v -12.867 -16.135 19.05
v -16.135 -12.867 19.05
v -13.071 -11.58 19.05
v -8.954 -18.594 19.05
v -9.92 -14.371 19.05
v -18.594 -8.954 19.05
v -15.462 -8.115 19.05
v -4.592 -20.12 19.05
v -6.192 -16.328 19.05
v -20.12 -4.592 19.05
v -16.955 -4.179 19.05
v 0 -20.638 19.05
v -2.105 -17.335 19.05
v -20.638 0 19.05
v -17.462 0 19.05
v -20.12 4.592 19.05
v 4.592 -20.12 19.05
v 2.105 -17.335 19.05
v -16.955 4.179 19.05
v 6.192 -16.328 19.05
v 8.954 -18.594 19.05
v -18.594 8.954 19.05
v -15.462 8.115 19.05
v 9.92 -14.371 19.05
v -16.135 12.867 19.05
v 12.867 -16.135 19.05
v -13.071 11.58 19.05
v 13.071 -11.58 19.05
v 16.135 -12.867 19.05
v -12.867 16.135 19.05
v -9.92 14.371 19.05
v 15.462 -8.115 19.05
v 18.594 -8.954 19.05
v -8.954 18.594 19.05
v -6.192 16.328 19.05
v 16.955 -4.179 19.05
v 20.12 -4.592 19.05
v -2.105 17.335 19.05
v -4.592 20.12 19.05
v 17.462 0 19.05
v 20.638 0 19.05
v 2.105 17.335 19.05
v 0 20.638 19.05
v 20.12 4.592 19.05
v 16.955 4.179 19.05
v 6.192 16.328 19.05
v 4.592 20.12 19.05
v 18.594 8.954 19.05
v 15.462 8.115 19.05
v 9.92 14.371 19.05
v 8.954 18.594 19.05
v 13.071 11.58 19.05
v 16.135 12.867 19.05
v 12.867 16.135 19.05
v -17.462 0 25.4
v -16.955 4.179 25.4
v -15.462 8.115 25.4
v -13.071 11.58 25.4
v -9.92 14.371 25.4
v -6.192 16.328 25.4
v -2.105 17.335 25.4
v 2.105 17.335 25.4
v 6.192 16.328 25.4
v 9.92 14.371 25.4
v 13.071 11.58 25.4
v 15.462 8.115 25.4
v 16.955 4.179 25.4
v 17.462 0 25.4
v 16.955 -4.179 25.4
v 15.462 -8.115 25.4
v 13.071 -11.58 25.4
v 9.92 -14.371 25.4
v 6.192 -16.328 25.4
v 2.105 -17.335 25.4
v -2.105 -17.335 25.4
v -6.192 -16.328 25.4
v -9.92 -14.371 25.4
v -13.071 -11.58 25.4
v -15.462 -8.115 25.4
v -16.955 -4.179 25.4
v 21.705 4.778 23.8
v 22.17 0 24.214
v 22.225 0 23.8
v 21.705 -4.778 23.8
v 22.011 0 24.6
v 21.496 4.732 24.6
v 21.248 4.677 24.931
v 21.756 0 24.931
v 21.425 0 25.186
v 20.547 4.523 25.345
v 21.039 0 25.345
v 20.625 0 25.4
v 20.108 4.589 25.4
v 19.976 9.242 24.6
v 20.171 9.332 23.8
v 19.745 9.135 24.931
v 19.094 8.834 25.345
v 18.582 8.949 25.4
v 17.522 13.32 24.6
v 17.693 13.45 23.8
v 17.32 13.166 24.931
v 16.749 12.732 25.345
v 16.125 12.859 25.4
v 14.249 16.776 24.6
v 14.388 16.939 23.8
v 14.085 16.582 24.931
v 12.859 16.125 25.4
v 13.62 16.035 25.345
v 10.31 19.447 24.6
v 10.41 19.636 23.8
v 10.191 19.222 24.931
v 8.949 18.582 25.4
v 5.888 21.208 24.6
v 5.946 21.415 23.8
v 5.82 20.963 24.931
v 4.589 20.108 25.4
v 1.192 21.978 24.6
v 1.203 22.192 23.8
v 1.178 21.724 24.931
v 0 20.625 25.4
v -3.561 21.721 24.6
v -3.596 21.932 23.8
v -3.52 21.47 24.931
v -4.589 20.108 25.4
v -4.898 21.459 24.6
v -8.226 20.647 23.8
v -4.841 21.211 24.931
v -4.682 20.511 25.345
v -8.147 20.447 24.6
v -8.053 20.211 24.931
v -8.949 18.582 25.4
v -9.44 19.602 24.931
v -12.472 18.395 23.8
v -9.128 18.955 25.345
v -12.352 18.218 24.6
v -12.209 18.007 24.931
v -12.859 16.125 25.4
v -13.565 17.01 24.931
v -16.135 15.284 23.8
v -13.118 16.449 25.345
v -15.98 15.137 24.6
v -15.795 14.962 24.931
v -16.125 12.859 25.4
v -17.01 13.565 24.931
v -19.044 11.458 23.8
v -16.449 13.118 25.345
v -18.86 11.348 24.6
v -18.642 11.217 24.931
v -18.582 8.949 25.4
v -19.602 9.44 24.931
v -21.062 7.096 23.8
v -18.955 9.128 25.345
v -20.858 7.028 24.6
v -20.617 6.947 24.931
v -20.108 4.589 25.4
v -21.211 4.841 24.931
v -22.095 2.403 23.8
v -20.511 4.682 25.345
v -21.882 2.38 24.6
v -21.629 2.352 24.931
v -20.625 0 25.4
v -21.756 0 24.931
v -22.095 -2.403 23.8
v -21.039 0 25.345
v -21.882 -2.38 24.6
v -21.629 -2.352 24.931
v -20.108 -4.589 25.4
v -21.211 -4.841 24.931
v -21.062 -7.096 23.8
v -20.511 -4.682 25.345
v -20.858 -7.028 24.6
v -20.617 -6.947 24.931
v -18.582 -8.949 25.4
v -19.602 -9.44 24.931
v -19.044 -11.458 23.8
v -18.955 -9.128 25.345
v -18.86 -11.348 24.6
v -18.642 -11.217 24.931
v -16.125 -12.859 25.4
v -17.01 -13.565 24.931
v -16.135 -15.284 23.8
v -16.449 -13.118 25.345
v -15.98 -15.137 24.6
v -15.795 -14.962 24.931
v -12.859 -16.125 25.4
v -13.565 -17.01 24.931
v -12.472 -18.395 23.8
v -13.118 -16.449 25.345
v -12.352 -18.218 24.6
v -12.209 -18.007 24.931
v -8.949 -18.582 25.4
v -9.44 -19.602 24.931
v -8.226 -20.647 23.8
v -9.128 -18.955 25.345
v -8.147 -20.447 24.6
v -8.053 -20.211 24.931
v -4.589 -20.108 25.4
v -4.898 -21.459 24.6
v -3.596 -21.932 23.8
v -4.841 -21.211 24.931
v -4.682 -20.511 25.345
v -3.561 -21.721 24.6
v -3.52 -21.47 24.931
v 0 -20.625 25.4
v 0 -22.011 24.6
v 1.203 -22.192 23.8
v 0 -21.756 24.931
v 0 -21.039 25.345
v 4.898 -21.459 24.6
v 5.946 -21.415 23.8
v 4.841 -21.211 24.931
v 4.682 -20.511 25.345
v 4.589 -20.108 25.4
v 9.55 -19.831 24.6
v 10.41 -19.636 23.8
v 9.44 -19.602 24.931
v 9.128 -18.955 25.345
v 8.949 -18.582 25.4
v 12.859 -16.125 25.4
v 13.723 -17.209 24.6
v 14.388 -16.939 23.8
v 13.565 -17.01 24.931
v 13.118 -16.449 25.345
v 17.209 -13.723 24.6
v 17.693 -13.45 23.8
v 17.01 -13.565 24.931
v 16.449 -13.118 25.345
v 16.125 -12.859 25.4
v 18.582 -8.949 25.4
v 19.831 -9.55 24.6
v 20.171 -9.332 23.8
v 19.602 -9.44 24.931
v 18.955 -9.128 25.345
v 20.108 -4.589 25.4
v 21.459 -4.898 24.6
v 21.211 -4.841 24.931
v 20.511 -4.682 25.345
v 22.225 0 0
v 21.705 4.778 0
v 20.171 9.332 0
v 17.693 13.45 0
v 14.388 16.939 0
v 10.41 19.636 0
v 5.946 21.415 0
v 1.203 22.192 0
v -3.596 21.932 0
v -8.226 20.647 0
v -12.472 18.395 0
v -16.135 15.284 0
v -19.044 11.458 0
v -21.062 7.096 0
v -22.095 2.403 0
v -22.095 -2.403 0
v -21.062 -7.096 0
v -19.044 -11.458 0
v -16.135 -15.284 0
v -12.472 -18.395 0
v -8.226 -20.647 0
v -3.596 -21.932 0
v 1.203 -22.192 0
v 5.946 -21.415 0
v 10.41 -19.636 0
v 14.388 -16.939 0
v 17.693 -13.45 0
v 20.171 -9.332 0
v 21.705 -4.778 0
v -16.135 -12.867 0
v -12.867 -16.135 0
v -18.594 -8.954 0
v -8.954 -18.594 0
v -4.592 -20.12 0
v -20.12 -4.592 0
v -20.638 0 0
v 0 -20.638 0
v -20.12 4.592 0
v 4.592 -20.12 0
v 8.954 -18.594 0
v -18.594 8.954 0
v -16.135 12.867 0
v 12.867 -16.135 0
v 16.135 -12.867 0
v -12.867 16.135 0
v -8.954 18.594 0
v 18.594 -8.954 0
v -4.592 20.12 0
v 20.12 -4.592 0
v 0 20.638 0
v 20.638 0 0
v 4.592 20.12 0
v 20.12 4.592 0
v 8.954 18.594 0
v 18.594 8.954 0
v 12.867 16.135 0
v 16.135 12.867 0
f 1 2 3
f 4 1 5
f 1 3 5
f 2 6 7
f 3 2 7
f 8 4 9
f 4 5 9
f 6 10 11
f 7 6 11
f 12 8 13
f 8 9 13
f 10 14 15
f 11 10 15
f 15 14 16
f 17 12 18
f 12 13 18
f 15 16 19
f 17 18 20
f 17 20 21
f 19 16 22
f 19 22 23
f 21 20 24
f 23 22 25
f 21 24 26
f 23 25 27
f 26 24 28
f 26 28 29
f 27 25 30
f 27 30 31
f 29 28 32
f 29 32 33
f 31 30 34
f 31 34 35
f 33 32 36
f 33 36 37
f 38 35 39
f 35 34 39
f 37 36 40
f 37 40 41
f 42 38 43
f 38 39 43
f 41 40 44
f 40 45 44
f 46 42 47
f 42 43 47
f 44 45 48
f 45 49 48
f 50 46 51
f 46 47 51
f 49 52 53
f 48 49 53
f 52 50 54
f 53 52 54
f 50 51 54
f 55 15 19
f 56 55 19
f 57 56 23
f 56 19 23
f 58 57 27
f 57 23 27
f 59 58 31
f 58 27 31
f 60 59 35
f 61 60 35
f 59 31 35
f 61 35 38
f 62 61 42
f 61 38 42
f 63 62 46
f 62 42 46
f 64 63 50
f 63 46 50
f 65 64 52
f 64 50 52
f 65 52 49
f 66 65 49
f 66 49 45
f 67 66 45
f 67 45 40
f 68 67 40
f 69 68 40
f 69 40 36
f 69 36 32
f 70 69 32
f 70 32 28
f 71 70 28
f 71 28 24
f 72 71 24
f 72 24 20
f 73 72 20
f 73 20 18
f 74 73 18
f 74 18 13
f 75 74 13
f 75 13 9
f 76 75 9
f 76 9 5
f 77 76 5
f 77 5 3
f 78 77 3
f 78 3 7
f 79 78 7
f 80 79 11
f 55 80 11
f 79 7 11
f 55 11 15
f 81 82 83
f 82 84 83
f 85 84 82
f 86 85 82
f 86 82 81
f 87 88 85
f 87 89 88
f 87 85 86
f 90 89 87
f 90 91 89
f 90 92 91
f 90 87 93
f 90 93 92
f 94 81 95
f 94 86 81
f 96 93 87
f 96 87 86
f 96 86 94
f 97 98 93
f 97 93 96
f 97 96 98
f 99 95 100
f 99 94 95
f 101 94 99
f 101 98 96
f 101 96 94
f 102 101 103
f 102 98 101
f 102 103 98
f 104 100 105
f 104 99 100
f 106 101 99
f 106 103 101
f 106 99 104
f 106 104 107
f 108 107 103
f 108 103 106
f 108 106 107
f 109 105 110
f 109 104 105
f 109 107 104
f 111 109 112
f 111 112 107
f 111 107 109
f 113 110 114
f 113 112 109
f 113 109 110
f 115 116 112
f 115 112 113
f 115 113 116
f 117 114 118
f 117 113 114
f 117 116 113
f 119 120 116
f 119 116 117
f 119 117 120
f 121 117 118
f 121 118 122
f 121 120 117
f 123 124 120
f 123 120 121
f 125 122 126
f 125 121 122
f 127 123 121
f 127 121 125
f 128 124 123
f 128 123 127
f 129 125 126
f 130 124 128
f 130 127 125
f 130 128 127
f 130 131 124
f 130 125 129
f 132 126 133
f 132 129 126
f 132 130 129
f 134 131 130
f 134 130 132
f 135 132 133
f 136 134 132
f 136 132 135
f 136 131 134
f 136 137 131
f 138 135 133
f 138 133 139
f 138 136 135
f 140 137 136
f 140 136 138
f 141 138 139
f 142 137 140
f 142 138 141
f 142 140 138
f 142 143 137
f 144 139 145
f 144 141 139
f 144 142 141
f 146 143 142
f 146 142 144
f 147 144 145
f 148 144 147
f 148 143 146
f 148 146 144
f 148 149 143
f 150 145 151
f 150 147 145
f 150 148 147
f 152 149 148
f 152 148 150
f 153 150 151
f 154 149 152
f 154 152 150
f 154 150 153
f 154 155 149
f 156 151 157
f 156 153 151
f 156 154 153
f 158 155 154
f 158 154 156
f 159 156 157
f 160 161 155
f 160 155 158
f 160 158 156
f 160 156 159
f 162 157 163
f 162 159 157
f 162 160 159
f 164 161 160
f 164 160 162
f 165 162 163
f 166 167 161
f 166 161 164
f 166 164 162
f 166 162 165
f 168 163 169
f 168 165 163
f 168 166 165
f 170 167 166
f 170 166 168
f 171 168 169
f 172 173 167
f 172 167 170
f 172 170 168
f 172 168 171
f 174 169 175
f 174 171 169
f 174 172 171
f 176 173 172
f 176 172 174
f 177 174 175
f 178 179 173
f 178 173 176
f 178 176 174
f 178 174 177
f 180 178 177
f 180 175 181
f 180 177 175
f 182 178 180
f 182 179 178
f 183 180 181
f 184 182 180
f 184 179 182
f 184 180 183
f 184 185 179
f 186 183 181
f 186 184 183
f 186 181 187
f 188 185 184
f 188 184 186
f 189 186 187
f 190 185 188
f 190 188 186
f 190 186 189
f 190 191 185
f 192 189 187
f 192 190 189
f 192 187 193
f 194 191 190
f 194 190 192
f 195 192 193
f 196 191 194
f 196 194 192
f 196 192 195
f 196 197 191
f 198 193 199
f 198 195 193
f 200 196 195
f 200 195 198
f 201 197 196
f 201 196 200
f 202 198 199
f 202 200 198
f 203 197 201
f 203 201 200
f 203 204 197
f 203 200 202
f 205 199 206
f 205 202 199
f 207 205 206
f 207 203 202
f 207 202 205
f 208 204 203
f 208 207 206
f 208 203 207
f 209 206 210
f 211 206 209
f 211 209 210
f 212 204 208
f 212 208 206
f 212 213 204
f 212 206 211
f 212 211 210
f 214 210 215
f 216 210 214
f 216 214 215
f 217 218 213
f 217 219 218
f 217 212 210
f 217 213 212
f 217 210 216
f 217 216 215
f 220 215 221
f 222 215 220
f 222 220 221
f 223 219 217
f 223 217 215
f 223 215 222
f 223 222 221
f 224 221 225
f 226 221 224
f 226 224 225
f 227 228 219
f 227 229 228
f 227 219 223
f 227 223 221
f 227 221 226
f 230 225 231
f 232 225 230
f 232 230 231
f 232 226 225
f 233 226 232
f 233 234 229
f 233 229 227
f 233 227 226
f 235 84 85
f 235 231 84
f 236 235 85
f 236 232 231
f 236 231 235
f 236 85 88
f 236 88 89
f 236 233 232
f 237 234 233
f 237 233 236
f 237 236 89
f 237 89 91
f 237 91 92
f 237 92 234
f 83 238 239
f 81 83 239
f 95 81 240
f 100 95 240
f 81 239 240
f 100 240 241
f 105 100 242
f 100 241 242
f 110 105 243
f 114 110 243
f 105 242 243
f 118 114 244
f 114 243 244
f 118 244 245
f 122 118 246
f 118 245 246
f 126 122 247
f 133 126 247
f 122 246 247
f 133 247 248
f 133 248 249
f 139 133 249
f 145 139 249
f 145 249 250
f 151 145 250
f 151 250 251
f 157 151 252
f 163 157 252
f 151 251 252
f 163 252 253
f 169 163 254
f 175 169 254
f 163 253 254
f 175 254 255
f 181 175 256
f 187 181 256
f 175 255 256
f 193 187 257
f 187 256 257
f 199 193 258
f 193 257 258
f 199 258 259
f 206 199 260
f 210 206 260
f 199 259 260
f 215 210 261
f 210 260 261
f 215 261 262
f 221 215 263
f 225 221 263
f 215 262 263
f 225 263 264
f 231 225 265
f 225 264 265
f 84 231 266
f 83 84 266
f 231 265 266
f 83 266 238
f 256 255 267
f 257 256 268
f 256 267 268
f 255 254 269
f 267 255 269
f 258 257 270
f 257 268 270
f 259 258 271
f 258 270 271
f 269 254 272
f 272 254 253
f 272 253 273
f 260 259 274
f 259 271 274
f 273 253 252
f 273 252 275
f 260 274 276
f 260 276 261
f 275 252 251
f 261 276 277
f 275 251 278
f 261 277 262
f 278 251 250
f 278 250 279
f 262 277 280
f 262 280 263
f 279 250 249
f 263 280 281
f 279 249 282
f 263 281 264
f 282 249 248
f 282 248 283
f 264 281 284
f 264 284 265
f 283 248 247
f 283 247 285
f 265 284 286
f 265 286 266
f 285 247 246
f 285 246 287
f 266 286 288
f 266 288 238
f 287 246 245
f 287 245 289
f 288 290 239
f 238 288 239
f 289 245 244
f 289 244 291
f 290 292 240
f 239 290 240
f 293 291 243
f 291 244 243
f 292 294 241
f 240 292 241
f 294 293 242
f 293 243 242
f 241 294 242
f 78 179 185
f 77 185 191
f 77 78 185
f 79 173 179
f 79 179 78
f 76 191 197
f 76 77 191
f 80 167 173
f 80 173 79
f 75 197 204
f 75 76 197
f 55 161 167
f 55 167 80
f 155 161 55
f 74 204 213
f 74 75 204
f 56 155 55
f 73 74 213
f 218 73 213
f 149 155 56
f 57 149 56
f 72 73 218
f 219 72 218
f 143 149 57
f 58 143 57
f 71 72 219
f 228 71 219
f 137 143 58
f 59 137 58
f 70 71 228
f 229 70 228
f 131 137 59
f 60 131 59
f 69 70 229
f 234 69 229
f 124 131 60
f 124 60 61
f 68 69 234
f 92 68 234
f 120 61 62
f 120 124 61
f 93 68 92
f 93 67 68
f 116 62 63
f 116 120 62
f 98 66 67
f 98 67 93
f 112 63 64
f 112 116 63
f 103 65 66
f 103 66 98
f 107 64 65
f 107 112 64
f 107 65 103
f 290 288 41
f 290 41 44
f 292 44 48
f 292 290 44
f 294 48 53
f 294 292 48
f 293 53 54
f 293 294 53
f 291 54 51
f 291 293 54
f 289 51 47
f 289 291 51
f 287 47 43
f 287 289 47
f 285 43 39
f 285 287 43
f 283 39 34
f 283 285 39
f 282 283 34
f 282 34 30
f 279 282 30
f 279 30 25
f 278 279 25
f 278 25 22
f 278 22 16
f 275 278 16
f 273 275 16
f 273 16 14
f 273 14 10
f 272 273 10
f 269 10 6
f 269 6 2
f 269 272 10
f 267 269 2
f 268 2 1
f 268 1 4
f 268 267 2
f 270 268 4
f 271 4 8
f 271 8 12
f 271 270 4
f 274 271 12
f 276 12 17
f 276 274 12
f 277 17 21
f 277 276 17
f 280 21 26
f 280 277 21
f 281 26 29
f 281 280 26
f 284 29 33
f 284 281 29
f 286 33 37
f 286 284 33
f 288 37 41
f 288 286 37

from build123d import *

# Parameters (mm, degrees)
F0_R     = 22.225
F0_R_2   = 20.6375
F1_DEPTH = 25.4
F2_DEPTH = 19.05
F4_D     = 34.925
F5_R     = 1.6002


with BuildPart() as f1:
    # F0 (on Top) → F1 (new body)
    with BuildSketch(Plane.XY):
        Circle(F0_R)
        Circle(F0_R_2, mode=Mode.SUBTRACT)
        Circle(F0_R_2)
    extrude(amount=F1_DEPTH)

    # F0 (on Top) → F2 (cut)
    with BuildSketch(Plane.XY):
        Circle(F0_R_2)
    extrude(amount=F2_DEPTH, mode=Mode.SUBTRACT)

    # F4 (through all)
    with Locations(Plane.XY.offset(25.4)):
        with Locations((0, 0)):
            Hole(F4_D / 2)

    # F5
    f5_edges = [f1.edges().sort_by_distance(p)[0] for p in [
        (-22.225, 0, 25.4),
    ]]
    fillet(f5_edges, radius=F5_R)


solid = f1.part
